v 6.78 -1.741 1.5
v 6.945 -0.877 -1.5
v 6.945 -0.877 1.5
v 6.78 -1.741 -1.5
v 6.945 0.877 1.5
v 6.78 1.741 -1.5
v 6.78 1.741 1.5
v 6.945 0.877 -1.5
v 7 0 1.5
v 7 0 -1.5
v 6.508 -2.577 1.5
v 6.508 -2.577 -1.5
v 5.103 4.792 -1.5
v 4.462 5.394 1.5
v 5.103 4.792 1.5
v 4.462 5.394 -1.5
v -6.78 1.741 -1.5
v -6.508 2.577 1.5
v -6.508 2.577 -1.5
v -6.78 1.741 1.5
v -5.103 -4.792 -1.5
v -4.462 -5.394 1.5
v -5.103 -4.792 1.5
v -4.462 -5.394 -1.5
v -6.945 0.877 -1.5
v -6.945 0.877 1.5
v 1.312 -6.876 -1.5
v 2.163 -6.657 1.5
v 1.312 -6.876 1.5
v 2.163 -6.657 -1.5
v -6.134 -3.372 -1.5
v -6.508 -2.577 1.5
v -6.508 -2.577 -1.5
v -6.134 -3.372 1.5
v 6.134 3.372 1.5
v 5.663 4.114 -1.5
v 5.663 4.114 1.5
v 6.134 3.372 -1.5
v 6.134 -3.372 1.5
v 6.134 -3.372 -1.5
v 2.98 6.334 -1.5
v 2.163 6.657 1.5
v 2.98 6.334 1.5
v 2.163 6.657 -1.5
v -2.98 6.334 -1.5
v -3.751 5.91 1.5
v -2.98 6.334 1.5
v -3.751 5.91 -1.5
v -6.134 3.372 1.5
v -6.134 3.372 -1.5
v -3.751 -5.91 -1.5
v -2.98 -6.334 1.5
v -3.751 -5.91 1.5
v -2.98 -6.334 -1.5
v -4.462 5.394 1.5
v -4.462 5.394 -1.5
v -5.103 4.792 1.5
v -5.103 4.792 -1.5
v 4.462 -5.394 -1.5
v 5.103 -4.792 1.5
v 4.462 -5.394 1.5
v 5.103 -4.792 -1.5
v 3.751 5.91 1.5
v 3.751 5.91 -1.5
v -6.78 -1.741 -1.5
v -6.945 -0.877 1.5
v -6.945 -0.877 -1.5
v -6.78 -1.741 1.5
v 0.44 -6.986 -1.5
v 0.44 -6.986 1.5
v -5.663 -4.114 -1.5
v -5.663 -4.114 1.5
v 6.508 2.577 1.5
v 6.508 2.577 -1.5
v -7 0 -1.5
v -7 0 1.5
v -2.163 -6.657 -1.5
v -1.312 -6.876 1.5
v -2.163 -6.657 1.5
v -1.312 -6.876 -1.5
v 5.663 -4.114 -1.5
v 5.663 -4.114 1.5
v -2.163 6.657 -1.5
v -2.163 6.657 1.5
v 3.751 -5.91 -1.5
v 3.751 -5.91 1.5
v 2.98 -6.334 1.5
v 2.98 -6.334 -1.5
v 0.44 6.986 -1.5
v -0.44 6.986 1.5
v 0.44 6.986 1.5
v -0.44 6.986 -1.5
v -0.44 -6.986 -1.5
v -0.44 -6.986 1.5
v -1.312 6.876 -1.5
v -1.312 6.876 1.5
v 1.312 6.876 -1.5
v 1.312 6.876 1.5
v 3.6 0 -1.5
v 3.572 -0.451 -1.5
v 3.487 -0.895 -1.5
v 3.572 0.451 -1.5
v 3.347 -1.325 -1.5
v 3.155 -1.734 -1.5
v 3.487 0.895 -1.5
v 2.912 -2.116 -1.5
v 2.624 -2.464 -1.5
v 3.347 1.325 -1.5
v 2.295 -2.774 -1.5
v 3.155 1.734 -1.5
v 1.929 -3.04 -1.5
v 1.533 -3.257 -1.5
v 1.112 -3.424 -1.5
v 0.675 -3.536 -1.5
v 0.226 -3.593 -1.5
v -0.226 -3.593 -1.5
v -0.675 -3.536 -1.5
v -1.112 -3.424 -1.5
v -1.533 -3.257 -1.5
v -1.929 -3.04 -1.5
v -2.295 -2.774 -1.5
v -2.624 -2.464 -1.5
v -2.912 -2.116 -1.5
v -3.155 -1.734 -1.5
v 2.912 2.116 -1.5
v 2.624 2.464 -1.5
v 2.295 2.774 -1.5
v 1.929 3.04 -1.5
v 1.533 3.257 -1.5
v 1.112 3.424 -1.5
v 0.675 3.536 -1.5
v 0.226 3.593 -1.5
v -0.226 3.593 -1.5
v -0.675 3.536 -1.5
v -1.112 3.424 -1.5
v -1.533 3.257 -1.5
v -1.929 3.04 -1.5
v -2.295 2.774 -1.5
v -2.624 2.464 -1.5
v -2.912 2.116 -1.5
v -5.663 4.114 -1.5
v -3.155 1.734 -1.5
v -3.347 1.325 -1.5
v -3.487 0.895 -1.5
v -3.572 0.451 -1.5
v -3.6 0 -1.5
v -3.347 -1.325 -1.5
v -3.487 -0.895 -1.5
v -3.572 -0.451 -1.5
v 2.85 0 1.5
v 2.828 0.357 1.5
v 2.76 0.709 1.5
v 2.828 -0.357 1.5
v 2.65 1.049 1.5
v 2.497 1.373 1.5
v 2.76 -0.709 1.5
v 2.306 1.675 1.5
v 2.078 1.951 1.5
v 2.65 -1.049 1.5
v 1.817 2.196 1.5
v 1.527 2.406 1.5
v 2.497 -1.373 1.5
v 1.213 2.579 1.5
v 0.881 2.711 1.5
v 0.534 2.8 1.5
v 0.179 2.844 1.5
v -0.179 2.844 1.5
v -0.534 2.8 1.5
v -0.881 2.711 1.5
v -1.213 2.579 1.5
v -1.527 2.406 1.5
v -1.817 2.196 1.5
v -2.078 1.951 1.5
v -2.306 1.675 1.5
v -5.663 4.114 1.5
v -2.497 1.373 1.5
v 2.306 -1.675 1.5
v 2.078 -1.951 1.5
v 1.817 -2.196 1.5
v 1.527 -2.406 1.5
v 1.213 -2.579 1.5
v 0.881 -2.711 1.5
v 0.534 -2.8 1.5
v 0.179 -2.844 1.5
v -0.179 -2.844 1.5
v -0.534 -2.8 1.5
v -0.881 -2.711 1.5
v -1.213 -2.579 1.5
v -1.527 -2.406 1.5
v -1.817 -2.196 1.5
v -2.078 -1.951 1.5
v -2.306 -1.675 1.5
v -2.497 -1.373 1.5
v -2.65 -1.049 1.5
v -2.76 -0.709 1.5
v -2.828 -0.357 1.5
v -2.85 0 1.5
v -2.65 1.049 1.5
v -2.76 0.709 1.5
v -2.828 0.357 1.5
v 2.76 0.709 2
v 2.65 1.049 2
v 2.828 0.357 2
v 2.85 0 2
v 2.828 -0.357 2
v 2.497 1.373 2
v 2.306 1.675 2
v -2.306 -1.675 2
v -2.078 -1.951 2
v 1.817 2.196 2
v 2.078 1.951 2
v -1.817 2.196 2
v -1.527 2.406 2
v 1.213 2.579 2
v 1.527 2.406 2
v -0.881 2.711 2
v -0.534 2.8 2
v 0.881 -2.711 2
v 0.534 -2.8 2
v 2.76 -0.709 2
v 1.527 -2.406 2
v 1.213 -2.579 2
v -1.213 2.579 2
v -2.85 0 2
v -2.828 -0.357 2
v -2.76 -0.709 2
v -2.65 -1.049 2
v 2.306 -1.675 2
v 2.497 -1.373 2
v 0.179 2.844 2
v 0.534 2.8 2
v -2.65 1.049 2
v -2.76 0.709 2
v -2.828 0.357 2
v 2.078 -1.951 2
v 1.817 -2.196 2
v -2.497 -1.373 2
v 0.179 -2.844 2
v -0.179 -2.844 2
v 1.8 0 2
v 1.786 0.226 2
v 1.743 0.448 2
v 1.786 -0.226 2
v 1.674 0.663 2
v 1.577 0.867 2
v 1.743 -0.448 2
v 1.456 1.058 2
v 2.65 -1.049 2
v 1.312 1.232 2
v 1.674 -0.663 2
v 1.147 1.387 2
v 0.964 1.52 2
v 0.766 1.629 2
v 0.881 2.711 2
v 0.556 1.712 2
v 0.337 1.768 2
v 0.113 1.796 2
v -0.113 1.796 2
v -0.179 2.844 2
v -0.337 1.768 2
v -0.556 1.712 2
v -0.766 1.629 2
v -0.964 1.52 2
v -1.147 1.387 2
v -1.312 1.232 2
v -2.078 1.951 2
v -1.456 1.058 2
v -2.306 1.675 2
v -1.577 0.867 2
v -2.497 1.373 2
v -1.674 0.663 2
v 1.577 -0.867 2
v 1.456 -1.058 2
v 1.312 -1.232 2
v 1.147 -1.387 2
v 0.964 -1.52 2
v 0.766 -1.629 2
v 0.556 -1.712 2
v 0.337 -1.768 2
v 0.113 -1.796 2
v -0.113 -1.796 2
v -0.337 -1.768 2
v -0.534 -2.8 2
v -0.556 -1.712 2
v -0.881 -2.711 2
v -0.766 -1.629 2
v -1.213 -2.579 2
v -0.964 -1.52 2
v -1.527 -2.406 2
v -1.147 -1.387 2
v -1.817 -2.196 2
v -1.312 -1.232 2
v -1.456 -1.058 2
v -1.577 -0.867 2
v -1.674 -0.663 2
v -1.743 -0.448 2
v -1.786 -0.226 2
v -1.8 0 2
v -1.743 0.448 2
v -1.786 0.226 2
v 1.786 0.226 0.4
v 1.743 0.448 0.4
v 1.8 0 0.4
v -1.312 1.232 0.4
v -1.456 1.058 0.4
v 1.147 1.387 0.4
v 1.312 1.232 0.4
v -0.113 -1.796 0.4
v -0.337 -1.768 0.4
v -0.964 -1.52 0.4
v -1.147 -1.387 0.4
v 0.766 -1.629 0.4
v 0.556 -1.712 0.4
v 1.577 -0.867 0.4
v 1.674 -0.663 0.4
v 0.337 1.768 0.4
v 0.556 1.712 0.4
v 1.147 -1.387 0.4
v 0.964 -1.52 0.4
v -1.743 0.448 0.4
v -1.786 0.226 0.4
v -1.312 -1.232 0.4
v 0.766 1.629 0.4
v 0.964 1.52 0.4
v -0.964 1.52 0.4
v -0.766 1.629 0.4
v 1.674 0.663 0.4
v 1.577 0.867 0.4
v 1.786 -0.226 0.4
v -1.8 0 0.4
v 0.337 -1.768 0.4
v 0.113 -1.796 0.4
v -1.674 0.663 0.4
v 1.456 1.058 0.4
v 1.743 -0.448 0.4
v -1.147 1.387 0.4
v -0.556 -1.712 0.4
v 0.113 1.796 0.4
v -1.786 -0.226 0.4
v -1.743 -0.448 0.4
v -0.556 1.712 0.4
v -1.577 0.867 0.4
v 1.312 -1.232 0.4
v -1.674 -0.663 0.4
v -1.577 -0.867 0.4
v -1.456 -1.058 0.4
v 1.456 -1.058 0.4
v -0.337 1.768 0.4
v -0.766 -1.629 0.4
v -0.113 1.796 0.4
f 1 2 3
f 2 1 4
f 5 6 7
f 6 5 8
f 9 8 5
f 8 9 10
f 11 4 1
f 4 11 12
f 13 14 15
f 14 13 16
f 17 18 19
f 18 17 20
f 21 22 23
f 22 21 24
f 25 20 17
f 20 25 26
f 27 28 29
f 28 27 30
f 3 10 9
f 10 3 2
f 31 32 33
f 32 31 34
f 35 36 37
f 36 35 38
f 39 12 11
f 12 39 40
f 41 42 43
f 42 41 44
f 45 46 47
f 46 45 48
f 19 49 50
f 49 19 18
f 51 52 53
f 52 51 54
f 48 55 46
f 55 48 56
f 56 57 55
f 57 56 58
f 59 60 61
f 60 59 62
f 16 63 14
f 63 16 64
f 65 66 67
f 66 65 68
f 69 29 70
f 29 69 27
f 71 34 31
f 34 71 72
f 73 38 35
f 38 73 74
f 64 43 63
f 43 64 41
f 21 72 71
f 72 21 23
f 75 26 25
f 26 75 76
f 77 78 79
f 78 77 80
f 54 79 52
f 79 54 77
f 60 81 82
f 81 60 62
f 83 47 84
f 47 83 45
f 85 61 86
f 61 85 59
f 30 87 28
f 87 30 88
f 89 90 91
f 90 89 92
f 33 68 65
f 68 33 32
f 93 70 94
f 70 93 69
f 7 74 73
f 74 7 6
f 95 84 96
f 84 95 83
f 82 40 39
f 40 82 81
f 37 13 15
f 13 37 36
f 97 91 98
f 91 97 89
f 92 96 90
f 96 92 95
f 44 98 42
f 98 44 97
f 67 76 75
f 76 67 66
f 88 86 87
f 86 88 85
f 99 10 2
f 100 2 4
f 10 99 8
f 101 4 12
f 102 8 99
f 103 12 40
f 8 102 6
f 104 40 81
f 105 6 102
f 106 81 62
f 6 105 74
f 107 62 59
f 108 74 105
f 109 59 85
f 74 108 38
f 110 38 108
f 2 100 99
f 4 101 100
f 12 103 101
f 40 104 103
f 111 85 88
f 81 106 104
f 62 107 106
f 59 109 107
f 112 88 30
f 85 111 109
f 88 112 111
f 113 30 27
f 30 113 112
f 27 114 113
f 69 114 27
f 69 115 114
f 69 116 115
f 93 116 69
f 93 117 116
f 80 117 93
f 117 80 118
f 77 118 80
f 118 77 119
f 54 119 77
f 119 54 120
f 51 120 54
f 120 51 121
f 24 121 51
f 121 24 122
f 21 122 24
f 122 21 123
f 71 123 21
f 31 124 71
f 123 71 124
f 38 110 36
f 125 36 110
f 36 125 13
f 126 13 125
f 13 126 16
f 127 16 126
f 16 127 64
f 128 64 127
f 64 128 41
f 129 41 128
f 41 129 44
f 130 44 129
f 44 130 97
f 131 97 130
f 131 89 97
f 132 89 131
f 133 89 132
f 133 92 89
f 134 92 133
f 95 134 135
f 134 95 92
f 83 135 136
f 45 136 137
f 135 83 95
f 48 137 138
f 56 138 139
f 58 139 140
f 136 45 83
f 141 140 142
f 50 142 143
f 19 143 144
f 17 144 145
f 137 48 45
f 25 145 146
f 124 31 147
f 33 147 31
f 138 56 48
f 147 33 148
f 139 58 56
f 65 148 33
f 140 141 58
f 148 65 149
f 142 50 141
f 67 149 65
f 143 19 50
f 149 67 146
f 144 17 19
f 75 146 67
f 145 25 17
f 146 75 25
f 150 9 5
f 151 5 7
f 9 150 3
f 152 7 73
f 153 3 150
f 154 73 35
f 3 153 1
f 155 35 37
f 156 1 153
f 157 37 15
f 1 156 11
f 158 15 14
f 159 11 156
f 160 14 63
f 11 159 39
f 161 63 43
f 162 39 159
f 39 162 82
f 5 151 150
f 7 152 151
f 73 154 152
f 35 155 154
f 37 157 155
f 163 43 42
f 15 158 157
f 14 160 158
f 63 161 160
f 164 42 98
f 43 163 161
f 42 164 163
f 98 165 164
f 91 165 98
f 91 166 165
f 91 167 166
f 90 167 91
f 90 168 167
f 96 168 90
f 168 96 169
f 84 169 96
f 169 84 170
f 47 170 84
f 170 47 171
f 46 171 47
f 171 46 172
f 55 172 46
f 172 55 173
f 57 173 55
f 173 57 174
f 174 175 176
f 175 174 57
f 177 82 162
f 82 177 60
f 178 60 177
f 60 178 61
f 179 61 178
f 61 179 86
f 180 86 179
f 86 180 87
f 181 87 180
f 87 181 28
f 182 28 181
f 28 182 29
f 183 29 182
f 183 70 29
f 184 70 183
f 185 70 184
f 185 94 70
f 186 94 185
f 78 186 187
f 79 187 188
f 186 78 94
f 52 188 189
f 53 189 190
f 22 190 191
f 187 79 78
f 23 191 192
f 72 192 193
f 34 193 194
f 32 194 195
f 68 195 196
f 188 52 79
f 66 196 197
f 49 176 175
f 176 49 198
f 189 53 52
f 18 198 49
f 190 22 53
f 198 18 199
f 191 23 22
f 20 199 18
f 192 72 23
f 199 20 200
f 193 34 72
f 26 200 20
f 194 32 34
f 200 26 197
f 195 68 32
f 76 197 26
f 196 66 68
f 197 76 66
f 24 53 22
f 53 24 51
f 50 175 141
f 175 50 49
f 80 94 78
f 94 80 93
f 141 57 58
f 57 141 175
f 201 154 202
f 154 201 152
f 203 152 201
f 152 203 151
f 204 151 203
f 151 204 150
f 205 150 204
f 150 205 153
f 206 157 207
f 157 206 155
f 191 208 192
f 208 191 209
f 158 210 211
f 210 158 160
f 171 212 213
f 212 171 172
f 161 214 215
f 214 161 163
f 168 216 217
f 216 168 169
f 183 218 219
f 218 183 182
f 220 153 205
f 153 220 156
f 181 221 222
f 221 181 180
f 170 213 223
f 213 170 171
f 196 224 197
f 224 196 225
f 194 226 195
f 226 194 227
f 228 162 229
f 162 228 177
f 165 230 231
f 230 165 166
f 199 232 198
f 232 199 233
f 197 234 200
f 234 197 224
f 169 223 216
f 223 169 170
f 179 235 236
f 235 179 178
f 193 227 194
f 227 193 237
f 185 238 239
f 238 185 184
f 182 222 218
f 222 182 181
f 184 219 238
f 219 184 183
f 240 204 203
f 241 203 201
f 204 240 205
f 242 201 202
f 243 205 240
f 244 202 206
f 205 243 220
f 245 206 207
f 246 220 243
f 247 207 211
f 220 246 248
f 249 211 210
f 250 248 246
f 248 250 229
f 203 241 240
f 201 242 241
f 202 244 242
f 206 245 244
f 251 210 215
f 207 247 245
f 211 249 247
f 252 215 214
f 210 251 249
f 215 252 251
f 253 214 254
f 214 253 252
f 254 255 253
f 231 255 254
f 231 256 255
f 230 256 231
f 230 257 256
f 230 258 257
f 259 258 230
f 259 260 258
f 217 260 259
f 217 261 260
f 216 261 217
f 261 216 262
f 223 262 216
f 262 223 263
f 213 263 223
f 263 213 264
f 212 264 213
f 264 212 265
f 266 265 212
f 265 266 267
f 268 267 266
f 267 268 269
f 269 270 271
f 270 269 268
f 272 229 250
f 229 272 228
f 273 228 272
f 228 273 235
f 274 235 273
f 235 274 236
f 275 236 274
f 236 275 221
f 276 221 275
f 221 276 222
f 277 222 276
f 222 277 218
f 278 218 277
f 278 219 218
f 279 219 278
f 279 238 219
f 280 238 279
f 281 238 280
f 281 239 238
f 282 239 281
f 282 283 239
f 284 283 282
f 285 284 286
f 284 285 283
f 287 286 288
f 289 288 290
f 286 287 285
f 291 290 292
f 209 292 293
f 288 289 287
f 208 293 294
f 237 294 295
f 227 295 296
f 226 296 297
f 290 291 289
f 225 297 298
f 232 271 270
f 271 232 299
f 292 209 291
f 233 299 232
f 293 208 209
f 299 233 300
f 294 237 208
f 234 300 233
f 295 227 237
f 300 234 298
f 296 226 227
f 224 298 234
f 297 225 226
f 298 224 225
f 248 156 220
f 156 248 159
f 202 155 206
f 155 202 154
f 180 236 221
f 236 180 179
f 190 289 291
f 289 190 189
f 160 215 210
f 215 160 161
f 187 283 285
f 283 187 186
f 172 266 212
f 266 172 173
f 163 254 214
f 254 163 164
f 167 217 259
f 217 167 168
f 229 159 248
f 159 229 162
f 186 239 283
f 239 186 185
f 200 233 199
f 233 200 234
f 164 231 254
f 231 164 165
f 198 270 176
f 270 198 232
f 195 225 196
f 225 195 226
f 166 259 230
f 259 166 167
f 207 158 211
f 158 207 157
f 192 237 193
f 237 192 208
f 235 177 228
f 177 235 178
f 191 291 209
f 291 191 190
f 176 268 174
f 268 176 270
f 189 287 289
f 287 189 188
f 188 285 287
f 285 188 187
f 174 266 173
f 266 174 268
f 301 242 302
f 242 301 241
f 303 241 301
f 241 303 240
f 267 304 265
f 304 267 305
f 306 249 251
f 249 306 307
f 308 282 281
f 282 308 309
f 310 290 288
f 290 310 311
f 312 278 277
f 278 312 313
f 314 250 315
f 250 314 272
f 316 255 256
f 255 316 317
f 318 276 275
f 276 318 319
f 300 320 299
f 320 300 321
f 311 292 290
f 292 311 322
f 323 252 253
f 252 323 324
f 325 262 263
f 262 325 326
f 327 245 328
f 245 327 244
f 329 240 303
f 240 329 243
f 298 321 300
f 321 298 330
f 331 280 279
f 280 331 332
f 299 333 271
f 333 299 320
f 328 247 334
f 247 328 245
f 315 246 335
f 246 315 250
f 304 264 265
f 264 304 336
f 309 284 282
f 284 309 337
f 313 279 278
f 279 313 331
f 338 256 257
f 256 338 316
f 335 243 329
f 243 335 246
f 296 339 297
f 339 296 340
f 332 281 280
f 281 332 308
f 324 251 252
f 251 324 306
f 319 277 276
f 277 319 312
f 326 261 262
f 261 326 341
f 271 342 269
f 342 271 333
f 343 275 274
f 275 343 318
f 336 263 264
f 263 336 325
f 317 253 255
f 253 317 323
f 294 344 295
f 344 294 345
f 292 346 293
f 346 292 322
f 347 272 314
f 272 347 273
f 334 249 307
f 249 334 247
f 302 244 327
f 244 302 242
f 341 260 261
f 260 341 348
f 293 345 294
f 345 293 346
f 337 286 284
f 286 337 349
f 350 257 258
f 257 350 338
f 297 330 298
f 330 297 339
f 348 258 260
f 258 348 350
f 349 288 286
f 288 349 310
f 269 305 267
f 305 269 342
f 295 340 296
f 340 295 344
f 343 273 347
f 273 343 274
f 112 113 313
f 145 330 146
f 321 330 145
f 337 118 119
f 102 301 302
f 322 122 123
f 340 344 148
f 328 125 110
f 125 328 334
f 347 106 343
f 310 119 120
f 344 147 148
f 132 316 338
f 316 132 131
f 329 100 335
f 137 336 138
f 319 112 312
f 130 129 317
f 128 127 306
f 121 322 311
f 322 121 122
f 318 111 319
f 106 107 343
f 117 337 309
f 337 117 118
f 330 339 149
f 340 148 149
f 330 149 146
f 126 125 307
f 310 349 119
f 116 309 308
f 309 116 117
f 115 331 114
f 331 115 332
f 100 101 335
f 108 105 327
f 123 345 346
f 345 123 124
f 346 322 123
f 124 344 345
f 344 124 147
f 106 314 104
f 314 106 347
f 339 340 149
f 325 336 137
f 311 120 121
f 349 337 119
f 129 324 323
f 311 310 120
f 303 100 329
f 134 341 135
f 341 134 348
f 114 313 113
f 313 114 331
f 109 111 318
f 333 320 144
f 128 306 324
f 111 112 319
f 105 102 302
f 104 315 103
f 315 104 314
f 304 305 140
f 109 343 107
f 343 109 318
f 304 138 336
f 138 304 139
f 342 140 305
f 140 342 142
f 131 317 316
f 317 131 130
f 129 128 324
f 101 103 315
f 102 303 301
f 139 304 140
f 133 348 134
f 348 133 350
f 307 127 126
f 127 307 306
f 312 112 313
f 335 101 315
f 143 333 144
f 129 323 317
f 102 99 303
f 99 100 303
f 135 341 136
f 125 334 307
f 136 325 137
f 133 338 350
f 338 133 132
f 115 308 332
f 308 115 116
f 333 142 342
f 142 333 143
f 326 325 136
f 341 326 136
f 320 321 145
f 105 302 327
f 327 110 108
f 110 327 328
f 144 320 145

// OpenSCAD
$fn = 50;


difference() {
	union() {
		translate(v = [0, 0, -1.5000000000]) {
			rotate(a = [0, 0, 0]) {
				cylinder(h = 3, r = 7.0000000000);
			}
		}
		translate(v = [0, 0, -1.5000000000]) {
			rotate(a = [0, 0, 0]) {
				cylinder(h = 3.5000000000, r = 2.8500000000);
			}
		}
	}
	union() {
		translate(v = [0, 0, -125.0000000000]) {
			rotate(a = [0, 0, 0]) {
				cylinder(h = 250, r = 1.8000000000);
			}
		}
		#translate(v = [0, 0, 0.4000000000]) {
			rotate(a = [0, 180, 0]) {
				cylinder(h = 1.9000000000, r1 = 1.8000000000, r2 = 3.6000000000);
			}
		}
		#translate(v = [0, 0, 2.0000000000]) {
			rotate(a = [0, 180, 0]) {
				cylinder(h = 3.5000000000, r = 1.8000000000);
			}
		}
	}
}
